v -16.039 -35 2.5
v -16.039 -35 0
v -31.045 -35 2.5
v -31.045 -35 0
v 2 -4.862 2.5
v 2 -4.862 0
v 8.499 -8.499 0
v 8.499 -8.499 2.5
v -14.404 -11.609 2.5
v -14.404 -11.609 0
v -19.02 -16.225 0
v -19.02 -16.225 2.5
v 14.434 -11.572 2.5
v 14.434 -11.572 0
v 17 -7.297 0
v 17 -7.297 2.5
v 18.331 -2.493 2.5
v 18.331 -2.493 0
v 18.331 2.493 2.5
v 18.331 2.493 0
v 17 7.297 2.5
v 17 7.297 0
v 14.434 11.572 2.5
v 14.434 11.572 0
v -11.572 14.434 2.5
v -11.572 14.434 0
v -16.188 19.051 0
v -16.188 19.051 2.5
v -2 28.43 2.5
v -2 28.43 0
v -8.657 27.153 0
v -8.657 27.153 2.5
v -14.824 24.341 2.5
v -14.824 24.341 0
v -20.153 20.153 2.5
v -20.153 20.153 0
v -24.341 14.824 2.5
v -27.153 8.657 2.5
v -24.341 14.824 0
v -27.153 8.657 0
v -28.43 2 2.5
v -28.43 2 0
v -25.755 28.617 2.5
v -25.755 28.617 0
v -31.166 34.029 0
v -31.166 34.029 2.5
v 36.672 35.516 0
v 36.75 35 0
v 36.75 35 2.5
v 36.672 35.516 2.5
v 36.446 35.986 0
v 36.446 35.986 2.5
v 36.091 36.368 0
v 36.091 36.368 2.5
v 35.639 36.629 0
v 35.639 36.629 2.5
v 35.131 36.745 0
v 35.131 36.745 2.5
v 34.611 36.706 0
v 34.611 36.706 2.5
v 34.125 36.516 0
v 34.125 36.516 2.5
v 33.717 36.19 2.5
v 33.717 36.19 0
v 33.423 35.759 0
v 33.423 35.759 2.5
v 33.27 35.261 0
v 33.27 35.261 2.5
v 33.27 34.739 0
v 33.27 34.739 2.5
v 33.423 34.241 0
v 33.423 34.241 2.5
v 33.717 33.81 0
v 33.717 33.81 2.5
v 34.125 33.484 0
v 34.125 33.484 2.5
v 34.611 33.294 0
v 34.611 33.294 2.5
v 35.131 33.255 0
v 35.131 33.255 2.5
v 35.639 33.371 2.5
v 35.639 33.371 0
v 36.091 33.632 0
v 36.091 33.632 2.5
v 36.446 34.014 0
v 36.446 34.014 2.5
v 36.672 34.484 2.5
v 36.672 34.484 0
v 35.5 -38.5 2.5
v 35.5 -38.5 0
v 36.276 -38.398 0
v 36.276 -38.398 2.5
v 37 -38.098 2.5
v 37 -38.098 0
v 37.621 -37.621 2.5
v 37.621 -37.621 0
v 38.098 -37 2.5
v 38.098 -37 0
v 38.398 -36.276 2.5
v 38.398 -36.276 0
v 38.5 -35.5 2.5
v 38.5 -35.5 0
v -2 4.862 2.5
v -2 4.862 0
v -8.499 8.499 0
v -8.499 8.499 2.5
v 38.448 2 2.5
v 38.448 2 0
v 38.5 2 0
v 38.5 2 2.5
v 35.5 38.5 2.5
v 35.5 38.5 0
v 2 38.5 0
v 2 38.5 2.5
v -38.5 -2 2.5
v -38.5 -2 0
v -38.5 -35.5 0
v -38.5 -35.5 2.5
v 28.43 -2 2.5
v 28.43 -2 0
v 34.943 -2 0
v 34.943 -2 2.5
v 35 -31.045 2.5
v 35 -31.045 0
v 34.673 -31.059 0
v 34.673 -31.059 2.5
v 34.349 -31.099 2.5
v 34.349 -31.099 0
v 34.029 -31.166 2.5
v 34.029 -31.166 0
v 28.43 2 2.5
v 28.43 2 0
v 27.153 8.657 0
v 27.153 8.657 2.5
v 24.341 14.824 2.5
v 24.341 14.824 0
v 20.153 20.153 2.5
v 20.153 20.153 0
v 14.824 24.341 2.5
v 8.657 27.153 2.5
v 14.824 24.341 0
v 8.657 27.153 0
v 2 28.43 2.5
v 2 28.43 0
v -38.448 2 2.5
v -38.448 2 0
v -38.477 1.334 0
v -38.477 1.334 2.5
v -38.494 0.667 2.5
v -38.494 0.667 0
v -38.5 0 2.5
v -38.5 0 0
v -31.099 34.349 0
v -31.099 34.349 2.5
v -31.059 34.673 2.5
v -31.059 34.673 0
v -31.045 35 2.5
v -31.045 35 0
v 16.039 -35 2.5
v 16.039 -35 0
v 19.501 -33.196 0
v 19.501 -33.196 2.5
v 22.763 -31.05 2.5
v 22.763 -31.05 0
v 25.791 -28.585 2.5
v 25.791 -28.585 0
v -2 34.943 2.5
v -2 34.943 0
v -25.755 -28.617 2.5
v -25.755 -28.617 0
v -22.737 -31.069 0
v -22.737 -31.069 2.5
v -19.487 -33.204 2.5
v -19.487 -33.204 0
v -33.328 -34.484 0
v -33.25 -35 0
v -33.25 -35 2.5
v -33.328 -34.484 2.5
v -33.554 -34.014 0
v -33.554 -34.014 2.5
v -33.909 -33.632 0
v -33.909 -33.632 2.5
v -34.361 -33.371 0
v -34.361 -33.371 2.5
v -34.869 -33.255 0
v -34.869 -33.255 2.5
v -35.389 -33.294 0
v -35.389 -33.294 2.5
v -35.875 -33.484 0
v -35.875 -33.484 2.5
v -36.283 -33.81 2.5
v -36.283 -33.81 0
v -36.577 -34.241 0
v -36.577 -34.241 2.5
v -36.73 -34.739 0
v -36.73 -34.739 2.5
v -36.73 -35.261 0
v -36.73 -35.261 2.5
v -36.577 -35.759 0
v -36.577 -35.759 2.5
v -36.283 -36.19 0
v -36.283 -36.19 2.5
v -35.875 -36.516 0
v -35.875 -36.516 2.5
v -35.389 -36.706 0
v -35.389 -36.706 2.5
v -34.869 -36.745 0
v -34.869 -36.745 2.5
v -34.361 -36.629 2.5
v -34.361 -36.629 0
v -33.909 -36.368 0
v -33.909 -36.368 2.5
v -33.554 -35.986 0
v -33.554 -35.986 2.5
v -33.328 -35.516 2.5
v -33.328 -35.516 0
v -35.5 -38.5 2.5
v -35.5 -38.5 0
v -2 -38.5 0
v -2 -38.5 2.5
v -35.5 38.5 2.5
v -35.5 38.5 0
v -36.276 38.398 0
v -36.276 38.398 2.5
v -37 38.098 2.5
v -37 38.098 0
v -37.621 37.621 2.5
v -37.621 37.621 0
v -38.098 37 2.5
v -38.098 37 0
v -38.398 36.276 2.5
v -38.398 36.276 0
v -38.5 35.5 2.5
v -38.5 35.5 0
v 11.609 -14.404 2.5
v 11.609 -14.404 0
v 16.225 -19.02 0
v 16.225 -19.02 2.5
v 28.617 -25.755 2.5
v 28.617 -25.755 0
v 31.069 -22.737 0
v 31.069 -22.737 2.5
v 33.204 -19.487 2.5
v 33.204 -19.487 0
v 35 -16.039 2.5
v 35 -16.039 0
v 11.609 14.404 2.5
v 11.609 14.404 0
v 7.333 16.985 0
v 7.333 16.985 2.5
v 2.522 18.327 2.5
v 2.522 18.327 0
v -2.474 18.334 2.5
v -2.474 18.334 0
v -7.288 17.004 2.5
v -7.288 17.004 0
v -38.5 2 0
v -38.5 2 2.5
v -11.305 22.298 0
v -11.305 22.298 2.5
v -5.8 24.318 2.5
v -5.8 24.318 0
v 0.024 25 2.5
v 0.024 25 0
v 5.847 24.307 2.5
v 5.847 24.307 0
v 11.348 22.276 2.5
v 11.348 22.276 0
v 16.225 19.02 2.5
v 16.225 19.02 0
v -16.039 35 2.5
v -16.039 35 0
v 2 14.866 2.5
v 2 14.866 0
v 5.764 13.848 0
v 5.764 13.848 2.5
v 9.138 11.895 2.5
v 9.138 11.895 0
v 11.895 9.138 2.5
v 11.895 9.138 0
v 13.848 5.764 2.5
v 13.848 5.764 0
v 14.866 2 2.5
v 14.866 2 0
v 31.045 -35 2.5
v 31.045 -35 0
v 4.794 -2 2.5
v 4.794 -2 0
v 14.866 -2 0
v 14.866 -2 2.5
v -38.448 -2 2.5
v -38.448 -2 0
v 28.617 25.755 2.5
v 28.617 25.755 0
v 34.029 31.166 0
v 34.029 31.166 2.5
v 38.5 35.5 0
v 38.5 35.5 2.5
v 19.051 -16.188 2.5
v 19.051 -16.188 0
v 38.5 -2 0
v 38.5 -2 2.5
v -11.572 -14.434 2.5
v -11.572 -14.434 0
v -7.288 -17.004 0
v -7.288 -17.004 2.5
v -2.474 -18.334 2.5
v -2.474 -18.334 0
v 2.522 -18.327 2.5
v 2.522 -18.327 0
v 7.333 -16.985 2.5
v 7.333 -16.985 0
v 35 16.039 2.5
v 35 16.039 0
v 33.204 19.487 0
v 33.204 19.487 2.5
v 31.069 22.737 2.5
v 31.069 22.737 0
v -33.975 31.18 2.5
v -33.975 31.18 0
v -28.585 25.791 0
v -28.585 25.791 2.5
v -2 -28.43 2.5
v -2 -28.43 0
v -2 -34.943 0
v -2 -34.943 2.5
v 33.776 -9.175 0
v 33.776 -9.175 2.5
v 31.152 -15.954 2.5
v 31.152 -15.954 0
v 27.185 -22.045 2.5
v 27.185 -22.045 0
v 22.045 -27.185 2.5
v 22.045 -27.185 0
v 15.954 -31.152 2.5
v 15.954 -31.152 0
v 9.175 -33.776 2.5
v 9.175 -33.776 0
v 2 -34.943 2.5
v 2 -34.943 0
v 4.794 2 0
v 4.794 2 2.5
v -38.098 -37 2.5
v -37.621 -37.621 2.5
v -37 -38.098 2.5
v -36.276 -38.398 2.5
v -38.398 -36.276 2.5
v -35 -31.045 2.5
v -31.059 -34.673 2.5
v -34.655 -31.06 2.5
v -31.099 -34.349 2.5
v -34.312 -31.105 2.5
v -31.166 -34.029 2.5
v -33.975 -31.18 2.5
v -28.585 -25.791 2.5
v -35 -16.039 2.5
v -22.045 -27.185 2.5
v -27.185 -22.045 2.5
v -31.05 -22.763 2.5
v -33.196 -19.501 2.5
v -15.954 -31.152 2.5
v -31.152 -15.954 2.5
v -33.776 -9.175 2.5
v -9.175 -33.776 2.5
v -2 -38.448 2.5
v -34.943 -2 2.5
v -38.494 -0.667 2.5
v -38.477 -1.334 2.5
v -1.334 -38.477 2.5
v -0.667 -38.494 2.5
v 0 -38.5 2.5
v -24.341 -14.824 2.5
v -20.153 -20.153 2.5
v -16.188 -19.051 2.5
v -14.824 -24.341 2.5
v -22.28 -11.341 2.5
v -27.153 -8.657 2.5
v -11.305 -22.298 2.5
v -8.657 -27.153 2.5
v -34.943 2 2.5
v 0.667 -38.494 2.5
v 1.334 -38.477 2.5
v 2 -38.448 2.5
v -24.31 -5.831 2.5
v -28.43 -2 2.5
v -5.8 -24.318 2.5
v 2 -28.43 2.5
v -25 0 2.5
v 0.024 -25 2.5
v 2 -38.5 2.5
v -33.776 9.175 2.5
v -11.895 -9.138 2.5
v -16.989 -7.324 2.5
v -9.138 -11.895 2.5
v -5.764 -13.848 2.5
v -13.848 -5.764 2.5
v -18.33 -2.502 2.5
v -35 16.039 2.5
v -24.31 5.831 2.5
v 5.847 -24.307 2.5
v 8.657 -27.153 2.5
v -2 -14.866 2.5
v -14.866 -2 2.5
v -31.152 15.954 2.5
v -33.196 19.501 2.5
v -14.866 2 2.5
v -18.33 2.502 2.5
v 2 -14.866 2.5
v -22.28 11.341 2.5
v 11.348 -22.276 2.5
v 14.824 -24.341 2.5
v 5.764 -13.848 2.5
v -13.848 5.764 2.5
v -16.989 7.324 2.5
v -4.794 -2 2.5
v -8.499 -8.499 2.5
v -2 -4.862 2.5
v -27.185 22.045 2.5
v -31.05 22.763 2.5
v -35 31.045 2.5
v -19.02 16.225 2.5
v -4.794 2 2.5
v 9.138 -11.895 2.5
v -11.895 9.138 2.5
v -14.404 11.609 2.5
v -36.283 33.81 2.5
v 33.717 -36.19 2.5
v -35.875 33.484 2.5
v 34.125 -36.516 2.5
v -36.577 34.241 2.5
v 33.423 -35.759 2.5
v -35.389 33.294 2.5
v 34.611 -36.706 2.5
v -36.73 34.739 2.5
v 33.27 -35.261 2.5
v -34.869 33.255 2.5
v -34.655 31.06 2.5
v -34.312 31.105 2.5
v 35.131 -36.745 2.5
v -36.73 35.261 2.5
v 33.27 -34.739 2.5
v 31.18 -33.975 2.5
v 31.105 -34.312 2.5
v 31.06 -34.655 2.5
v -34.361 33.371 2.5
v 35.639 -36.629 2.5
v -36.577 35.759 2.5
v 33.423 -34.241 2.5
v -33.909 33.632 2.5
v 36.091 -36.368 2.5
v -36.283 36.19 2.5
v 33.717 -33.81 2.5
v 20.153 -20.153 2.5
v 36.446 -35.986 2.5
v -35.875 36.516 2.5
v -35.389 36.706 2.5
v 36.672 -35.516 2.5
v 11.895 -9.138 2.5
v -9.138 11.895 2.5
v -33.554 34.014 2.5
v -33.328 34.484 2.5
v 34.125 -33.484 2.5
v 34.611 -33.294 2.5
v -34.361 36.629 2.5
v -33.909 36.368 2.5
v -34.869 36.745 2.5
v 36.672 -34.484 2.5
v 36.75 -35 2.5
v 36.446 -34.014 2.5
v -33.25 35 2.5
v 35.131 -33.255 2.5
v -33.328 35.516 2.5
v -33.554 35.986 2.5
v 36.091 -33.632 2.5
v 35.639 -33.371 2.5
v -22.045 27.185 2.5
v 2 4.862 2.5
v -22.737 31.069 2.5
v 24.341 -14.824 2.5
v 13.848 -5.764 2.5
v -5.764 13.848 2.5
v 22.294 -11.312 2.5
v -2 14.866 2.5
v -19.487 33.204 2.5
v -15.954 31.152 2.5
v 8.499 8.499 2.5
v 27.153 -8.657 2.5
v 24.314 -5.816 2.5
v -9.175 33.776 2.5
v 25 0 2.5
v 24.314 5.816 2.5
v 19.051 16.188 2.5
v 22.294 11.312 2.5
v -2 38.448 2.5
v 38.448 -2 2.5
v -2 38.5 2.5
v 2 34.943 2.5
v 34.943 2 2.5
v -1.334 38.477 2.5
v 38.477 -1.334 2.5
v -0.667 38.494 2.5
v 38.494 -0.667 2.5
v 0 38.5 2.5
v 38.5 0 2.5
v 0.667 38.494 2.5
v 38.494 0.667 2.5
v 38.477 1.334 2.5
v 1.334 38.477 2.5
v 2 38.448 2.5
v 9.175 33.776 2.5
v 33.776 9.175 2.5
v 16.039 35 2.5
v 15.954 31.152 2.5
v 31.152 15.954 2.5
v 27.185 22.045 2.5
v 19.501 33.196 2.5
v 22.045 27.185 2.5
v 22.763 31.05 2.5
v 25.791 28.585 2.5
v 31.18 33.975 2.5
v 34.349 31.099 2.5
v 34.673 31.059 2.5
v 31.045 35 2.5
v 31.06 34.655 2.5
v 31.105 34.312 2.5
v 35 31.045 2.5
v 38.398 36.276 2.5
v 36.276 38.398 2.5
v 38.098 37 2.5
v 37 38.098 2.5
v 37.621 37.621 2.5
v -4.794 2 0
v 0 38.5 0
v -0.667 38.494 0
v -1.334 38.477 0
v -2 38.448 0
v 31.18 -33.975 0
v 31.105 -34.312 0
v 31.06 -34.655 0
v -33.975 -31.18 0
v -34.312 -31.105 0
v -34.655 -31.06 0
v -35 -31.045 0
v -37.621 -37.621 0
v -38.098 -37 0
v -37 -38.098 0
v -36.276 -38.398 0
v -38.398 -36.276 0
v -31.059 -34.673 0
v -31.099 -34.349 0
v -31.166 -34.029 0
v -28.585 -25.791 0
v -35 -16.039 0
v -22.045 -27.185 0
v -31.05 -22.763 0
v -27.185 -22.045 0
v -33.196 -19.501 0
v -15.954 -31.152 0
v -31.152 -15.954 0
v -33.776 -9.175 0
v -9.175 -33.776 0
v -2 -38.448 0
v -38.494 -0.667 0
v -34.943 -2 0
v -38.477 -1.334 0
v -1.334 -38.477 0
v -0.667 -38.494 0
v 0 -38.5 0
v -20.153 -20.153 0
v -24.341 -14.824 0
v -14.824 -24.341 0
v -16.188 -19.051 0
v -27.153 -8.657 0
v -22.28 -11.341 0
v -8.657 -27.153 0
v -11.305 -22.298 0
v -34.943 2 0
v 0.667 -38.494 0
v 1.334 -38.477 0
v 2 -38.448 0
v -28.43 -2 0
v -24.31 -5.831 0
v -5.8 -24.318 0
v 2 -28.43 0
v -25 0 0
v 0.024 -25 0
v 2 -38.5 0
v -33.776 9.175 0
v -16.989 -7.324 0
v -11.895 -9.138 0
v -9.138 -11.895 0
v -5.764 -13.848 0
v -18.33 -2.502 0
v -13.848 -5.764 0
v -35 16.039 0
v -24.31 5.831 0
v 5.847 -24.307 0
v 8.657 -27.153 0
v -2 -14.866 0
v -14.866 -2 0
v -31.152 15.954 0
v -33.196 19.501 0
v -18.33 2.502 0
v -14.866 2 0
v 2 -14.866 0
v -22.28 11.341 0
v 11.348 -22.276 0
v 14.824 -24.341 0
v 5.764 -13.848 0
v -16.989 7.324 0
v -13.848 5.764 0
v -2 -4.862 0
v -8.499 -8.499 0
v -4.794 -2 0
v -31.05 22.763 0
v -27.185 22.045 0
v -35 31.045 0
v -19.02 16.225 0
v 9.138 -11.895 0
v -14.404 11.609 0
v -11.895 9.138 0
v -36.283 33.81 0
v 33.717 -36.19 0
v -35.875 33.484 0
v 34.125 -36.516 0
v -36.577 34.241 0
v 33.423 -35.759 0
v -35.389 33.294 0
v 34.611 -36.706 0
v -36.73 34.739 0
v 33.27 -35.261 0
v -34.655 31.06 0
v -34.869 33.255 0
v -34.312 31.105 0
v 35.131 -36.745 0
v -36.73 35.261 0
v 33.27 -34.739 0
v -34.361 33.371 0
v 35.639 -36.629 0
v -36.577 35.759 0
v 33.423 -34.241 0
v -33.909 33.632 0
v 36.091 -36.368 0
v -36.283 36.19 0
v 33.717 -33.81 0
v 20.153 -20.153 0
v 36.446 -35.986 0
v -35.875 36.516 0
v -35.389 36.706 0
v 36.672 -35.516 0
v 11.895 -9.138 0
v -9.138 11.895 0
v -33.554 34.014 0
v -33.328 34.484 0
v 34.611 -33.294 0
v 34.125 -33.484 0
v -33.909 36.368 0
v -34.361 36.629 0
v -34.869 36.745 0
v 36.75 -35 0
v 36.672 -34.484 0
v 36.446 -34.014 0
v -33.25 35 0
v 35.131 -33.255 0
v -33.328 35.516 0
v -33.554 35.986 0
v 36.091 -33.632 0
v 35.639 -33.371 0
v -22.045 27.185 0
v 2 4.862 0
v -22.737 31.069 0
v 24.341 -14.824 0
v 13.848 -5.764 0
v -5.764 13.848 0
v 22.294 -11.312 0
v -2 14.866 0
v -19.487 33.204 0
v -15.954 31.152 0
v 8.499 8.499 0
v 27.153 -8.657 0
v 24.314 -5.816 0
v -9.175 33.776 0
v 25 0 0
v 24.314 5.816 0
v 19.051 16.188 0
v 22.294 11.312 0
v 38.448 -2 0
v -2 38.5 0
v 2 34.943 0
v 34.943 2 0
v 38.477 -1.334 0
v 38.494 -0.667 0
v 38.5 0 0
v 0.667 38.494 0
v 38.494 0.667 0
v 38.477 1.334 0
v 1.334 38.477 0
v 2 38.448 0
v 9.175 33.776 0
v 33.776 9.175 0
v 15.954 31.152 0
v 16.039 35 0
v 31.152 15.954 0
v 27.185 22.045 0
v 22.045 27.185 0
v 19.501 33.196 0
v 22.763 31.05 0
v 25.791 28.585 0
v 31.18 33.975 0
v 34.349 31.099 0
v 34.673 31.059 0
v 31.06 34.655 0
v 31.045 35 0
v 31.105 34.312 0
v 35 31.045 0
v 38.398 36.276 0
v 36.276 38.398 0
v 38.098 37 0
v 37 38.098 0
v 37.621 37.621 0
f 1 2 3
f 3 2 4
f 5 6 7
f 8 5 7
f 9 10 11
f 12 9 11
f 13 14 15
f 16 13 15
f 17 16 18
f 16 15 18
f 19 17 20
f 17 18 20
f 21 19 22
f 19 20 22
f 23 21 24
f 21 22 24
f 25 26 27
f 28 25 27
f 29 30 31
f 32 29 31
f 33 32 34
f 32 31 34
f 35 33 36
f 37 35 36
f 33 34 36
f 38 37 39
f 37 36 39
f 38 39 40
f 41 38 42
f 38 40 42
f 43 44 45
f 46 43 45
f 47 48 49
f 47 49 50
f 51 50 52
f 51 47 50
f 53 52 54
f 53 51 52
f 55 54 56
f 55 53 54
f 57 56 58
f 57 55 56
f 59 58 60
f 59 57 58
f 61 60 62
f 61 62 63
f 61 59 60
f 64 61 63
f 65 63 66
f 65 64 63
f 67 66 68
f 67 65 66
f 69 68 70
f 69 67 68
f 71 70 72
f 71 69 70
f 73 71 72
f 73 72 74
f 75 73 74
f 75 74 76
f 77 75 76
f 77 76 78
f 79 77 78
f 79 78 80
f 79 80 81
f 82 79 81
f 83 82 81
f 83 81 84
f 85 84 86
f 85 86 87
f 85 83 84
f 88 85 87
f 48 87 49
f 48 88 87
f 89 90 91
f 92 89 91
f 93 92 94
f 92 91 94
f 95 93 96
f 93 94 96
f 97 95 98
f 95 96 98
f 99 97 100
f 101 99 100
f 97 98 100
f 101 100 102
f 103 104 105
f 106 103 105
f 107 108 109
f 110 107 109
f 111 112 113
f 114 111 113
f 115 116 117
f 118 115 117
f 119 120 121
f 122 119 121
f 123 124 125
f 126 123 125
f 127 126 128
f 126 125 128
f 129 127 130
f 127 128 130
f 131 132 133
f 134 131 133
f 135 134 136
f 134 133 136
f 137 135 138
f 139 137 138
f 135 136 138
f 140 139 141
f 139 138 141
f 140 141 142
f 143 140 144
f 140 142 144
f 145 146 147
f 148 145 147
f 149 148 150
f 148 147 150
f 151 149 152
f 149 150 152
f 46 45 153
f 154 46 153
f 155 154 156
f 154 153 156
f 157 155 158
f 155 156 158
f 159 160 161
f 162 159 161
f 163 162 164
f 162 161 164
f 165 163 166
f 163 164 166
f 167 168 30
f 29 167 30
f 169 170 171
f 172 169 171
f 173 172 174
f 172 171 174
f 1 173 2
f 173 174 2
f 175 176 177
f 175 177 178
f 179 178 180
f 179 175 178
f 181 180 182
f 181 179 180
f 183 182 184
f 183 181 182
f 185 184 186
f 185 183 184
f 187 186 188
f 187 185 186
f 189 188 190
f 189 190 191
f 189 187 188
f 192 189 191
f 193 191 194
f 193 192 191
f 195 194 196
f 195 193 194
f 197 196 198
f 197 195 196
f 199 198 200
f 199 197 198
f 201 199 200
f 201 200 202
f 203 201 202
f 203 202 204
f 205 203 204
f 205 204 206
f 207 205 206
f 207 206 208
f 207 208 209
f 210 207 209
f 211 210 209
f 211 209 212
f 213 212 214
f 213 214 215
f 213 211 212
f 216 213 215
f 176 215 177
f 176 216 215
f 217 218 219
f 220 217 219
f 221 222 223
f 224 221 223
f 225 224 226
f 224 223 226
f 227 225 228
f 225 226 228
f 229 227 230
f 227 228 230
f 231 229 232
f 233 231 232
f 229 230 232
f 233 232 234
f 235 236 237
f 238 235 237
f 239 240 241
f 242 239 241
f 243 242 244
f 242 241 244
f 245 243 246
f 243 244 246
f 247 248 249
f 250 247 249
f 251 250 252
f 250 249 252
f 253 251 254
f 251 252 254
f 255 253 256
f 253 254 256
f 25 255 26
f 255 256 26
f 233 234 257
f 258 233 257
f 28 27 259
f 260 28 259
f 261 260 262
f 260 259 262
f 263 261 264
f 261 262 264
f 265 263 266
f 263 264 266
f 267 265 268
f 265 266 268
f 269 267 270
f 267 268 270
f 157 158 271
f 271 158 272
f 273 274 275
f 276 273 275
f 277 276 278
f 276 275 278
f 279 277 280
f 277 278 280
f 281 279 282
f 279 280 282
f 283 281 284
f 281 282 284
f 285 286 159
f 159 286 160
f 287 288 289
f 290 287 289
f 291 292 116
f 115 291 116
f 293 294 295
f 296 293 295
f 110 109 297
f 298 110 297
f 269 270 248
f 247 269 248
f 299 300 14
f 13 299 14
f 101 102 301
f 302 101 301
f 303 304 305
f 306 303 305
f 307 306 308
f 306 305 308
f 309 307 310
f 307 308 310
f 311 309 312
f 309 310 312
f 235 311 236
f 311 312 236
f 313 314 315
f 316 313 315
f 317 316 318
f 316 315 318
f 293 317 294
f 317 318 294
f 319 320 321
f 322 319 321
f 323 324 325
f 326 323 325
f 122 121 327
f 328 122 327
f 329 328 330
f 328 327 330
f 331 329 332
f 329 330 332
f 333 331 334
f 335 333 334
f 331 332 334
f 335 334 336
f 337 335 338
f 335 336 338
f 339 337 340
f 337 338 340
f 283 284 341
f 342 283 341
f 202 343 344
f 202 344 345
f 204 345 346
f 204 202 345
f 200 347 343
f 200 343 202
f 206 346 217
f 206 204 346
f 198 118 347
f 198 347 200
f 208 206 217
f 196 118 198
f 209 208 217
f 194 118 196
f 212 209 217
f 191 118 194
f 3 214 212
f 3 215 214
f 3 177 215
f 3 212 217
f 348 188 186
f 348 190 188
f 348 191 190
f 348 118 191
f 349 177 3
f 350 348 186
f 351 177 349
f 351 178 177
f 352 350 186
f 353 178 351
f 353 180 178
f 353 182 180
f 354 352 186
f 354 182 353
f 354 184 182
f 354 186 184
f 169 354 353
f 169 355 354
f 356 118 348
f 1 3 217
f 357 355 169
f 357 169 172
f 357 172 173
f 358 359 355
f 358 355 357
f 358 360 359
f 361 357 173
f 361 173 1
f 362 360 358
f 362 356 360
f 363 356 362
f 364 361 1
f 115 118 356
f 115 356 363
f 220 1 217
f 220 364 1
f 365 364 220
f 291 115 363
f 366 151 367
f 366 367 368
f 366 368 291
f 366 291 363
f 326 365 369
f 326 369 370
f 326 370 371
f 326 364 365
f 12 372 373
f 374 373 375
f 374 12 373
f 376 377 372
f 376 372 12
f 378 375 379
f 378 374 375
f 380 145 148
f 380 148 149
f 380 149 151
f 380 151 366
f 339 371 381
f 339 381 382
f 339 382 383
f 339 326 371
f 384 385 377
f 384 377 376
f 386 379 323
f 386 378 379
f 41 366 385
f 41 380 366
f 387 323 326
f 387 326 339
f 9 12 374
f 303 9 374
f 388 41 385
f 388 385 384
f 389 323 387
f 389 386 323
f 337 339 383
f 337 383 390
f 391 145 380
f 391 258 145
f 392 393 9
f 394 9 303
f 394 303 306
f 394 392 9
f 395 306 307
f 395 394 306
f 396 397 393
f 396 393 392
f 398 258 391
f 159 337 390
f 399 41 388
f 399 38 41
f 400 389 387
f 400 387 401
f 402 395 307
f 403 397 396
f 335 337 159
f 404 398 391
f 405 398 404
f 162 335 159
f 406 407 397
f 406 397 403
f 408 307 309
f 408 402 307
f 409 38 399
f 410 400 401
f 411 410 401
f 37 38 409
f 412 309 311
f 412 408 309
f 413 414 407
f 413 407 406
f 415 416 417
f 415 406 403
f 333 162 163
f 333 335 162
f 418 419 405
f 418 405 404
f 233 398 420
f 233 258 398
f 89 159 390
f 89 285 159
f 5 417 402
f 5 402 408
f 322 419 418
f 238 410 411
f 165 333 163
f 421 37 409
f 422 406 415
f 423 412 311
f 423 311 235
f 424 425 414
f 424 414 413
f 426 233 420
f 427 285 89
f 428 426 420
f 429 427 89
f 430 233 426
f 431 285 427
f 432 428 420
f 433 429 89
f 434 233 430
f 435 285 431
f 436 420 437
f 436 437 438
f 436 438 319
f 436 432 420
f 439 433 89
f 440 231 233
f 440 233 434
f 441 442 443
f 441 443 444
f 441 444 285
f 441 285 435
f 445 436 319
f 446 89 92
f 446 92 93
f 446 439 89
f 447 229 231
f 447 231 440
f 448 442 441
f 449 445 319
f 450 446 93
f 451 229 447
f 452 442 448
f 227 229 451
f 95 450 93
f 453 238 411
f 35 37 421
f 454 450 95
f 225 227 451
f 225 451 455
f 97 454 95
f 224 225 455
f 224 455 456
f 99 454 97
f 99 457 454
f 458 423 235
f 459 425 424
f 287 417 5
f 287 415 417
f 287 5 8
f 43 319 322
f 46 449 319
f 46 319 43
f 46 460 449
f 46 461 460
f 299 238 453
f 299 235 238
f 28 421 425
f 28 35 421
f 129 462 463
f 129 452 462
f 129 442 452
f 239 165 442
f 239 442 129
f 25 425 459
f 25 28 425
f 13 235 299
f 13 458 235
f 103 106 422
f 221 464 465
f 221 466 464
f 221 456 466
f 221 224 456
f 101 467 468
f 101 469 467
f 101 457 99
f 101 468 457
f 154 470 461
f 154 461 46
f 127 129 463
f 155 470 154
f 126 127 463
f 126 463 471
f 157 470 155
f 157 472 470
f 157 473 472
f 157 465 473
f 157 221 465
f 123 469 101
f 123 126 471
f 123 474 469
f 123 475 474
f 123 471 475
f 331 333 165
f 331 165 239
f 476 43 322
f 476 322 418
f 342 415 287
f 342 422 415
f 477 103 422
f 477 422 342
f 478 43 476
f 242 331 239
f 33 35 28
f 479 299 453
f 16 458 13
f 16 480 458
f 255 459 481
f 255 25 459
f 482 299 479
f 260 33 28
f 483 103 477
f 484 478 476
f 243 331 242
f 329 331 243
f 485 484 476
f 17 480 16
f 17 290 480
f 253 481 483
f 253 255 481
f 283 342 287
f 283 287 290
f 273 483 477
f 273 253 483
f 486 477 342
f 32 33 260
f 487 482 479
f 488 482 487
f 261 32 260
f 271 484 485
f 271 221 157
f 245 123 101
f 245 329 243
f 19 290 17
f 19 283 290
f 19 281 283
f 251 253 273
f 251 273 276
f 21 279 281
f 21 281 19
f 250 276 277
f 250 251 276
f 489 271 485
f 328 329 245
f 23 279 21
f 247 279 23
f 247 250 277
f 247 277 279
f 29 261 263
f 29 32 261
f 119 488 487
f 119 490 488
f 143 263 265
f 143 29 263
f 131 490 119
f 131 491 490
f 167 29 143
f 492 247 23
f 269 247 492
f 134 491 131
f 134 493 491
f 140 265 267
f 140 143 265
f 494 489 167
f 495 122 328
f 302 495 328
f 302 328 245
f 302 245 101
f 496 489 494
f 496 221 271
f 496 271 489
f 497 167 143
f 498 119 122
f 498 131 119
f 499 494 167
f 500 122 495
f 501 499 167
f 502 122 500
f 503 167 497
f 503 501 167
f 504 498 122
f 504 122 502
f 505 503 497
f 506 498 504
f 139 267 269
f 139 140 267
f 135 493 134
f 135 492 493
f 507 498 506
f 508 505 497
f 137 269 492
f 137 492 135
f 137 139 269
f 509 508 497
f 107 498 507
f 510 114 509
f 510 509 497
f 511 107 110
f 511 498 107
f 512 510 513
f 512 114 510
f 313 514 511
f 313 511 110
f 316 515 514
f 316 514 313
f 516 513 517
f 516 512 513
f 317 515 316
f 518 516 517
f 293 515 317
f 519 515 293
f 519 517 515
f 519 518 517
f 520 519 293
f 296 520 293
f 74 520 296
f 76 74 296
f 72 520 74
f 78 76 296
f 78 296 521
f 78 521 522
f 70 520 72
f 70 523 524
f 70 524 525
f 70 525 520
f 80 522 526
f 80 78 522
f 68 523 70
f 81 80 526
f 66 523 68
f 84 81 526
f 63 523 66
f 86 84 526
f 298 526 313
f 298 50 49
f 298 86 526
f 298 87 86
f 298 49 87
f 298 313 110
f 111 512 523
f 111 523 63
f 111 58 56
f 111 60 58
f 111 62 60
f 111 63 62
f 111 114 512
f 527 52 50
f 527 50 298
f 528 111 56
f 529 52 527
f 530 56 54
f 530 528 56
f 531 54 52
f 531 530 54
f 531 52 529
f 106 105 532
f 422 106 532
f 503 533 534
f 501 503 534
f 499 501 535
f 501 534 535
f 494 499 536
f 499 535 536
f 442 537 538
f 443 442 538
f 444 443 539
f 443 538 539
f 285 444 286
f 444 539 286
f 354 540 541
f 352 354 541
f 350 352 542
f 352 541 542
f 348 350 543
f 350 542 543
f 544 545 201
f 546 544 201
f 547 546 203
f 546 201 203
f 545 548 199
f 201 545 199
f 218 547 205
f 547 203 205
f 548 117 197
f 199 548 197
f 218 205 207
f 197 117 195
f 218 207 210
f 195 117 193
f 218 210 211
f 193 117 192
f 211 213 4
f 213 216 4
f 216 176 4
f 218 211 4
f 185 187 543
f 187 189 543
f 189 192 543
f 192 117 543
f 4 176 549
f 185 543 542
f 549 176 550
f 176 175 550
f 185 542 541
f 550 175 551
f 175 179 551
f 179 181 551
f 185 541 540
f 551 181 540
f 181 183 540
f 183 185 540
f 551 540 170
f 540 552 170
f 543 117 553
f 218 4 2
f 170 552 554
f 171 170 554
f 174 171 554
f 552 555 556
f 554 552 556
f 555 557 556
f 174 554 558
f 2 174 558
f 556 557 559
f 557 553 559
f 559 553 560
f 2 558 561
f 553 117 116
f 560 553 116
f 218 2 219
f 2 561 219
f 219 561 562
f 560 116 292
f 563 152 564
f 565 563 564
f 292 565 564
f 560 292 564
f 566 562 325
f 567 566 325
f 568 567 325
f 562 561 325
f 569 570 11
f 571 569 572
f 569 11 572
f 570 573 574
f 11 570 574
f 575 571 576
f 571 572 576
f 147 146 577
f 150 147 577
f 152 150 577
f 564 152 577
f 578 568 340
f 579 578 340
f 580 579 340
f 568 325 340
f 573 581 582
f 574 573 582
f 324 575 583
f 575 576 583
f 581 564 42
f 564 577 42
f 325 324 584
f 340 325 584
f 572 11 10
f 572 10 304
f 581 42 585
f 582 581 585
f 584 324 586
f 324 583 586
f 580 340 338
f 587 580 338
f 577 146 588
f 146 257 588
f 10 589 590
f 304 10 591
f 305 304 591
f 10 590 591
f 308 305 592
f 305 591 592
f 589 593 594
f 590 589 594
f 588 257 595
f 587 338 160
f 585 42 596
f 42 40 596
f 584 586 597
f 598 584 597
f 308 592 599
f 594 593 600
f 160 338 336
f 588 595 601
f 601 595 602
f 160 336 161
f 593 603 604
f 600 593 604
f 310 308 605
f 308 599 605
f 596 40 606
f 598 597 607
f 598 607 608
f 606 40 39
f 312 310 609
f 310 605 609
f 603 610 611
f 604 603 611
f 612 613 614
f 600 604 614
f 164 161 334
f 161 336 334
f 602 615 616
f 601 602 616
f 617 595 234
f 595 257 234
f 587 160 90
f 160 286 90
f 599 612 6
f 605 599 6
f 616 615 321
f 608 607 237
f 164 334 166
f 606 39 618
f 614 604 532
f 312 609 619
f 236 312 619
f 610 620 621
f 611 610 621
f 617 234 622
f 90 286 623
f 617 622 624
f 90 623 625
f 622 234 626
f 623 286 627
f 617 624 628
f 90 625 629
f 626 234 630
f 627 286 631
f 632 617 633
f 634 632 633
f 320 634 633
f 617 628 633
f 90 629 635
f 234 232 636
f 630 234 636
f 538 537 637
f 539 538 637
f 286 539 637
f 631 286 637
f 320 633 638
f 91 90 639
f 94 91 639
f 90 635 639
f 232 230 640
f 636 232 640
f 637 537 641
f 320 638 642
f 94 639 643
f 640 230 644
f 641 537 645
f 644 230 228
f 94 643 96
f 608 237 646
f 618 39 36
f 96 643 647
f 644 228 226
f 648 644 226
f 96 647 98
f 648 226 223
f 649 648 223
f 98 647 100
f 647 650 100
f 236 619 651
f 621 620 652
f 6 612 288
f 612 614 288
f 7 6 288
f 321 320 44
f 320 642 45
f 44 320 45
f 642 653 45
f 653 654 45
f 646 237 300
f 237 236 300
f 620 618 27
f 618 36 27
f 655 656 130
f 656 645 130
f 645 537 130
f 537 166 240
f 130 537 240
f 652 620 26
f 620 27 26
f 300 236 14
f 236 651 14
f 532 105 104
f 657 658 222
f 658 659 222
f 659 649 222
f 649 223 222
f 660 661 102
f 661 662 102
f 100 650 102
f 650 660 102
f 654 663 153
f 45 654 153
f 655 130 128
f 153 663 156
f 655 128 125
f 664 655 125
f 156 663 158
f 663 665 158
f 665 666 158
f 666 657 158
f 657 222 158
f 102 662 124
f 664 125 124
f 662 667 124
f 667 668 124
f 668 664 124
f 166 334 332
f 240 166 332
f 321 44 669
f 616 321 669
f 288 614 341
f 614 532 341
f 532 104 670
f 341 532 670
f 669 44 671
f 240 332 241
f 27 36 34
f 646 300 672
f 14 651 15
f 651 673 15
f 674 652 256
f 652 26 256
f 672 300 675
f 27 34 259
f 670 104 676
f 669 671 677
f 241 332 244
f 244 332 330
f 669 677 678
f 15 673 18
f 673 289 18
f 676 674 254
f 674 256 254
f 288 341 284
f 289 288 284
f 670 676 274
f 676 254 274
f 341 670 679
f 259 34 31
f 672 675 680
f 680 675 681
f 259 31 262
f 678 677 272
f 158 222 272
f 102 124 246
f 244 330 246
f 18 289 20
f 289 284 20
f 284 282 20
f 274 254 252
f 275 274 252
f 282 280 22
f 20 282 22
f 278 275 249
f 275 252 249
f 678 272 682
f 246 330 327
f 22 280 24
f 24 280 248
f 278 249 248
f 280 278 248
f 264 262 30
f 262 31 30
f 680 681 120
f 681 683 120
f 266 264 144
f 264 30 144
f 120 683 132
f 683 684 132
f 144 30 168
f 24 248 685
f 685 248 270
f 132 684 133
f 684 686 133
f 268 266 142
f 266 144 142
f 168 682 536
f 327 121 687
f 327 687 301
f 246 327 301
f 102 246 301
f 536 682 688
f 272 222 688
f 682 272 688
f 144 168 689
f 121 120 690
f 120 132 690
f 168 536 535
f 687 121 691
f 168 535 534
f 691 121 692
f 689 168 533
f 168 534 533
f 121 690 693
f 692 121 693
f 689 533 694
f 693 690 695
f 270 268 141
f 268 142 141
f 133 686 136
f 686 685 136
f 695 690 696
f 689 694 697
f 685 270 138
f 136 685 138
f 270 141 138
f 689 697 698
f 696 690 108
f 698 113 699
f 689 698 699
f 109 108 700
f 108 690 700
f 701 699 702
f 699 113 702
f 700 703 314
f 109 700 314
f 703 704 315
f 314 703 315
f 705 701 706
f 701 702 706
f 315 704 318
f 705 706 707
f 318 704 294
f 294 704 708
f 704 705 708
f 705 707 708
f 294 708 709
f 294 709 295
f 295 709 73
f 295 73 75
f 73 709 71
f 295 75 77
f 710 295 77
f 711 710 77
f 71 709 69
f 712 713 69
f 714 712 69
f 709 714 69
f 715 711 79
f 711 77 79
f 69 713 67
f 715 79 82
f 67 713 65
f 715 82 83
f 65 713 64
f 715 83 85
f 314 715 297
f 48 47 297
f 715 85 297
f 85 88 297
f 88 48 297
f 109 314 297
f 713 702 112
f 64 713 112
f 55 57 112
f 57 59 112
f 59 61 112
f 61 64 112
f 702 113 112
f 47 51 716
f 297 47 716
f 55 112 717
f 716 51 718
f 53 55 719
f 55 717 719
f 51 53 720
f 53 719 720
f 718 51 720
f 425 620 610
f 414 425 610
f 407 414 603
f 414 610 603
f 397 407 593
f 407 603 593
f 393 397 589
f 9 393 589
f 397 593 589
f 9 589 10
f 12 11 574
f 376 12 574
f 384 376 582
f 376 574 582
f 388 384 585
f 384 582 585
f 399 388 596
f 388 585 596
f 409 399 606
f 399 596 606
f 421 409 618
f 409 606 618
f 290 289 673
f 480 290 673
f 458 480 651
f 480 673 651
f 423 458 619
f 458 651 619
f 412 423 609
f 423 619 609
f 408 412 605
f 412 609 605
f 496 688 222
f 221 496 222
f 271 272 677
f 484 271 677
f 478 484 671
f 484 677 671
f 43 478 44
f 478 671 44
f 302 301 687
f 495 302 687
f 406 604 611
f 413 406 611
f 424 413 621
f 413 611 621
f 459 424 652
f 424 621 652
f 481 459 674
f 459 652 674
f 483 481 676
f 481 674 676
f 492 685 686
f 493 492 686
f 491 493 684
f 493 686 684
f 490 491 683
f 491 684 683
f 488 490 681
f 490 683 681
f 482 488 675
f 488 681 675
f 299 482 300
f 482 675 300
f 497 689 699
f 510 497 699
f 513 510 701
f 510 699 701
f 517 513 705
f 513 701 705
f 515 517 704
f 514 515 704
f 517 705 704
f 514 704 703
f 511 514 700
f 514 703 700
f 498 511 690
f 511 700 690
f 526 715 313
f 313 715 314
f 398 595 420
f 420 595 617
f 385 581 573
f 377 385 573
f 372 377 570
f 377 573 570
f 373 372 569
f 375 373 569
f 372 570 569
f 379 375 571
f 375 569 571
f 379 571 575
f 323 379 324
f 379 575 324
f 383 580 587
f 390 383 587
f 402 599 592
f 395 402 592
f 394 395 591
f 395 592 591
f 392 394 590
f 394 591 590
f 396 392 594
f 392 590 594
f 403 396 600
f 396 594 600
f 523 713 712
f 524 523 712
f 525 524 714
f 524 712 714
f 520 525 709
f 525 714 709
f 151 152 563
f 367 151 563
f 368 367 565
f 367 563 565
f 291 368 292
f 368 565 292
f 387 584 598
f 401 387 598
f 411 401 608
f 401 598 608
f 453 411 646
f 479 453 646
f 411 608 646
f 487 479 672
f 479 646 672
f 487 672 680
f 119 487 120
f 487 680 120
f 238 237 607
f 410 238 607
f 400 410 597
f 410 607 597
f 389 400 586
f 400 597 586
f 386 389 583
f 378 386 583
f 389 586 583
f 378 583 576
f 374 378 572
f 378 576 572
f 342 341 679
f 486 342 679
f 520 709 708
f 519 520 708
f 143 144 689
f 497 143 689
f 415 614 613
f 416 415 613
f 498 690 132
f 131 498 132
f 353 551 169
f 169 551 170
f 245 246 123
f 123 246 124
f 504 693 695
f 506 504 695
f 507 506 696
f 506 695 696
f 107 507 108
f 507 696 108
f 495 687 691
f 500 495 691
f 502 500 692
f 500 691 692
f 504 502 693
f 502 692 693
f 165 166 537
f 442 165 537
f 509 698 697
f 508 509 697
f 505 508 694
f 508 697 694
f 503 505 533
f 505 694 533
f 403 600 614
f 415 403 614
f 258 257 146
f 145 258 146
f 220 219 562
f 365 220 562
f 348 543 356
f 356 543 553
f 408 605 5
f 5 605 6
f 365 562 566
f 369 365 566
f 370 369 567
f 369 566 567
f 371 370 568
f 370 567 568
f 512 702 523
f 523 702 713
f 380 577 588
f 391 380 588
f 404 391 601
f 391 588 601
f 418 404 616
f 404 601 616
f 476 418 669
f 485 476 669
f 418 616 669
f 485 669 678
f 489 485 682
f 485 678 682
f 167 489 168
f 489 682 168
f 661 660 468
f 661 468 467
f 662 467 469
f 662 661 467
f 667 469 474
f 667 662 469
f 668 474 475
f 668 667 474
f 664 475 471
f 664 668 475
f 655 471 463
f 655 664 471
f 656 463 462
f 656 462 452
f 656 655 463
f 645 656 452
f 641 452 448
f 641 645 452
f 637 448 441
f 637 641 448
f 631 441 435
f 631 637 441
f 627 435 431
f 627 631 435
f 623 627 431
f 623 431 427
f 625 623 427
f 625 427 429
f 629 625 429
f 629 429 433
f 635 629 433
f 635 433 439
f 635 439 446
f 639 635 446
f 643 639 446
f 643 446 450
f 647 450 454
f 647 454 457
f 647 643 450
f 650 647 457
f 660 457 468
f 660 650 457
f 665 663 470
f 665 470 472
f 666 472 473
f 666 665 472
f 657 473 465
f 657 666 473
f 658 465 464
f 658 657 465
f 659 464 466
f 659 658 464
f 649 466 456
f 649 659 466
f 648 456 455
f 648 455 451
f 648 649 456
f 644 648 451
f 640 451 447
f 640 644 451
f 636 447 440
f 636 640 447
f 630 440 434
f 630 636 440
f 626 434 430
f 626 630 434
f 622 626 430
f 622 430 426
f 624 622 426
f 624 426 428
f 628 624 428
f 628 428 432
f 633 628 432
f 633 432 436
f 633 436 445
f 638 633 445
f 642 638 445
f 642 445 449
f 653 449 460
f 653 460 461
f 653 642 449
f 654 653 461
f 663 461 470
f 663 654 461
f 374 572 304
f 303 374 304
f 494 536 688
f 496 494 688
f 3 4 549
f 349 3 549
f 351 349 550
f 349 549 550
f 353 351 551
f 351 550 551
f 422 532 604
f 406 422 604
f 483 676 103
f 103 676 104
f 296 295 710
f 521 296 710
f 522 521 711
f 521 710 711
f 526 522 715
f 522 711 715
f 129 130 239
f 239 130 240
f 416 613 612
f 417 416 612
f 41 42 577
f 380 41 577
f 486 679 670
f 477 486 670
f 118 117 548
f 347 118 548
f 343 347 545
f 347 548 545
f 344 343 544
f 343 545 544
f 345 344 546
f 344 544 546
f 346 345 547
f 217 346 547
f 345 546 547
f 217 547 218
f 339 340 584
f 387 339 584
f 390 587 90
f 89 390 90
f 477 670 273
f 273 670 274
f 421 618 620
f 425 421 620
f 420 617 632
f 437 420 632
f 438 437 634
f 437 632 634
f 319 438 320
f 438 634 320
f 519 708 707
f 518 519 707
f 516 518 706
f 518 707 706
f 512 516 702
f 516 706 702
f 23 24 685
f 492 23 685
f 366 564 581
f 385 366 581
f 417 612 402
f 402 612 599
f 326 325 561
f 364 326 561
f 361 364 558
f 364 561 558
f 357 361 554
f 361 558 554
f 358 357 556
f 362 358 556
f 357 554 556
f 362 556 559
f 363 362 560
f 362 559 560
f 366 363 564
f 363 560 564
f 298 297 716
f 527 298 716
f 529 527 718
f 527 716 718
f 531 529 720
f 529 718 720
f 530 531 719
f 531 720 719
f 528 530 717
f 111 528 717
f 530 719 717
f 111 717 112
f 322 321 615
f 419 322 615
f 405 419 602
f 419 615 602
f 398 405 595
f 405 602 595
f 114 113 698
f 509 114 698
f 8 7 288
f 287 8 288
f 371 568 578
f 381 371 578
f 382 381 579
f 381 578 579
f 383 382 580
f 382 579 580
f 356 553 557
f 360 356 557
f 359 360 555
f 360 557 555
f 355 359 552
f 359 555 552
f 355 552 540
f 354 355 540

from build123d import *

# Parameters (mm, degrees)
F0_R     = 1.75
F1_DEPTH = 2.5


with BuildPart() as f1:
    # F0 (on Top) → F1 (new body)
    with BuildSketch(Plane.XY):
        with BuildLine():
            ThreePointArc((-38.5, -35.5), (-37.62132, -37.62132), (-35.5, -38.5))
            Line((-35.5, -38.5), (-2, -38.5))
            Line((-2, -38.5), (-2, -38.448017))
            ThreePointArc((-2, -38.448017), (-1.000338, -38.487002), (0, -38.5))
            ThreePointArc((0, -38.5), (1.000338, -38.487002), (2, -38.448017))
            Line((2, -38.448017), (2, -38.5))
            Line((2, -38.5), (35.5, -38.5))
            ThreePointArc((35.5, -38.5), (37.62132, -37.62132), (38.5, -35.5))
            Line((38.5, -35.5), (38.5, -2))
            Line((38.5, -2), (38.448017, -2))
            ThreePointArc((38.448017, -2), (38.487002, -1.000338), (38.5, 0))
            ThreePointArc((38.5, 0), (38.487002, 1.000338), (38.448017, 2))
            Line((38.448017, 2), (38.5, 2))
            Line((38.5, 2), (38.5, 35.5))
            ThreePointArc((38.5, 35.5), (37.62132, 37.62132), (35.5, 38.5))
            Line((35.5, 38.5), (2, 38.5))
            Line((2, 38.5), (2, 38.448017))
            ThreePointArc((2, 38.448017), (1.000338, 38.487002), (0, 38.5))
            ThreePointArc((0, 38.5), (-1.000338, 38.487002), (-2, 38.448017))
            Line((-2, 38.448017), (-2, 38.5))
            Line((-2, 38.5), (-35.5, 38.5))
            ThreePointArc((-35.5, 38.5), (-37.62132, 37.62132), (-38.5, 35.5))
            Line((-38.5, 35.5), (-38.5, 2))
            Line((-38.5, 2), (-38.448017, 2))
            ThreePointArc((-38.448017, 2), (-38.487002, 1.000338), (-38.5, 0))
            ThreePointArc((-38.5, 0), (-38.487002, -1.000338), (-38.448017, -2))
            Line((-38.448017, -2), (-38.5, -2))
            Line((-38.5, -2), (-38.5, -35.5))
        make_face()
        with Locations((-35, -35)):
            Circle(F0_R, mode=Mode.SUBTRACT)
        with BuildLine():
            Line((-16.039015, -35), (-31.045212, -35))
            ThreePointArc((-31.045212, -35), (-31.075605, -34.510637), (-31.166319, -34.028796))
            Line((-31.166319, -34.028796), (-25.754724, -28.617201))
            ThreePointArc((-25.754724, -28.617201), (-21.139162, -32.177412), (-16.039015, -35))
        make_face(mode=Mode.SUBTRACT)
        with BuildLine():
            ThreePointArc((-33.974785, -31.180408), (-34.482954, -31.079157), (-35, -31.045212))
            Line((-35, -31.045212), (-35, -16.039015))
            ThreePointArc((-35, -16.039015), (-32.164167, -21.159309), (-28.584922, -25.790545))
            Line((-28.584922, -25.790545), (-33.974785, -31.180408))
        make_face(mode=Mode.SUBTRACT)
        with BuildLine():
            Line((-2, -28.429738), (-2, -34.94281))
            ThreePointArc((-2, -34.94281), (-24.748737, -24.748737), (-34.94281, -2))
            Line((-34.94281, -2), (-28.429738, -2))
            ThreePointArc((-28.429738, -2), (-20.152543, -20.152543), (-2, -28.429738))
        make_face(mode=Mode.SUBTRACT)
        with BuildLine():
            Line((-2, -4.862478), (-2, -14.866069))
            ThreePointArc((-2, -14.866069), (-10.606602, -10.606602), (-14.866069, -2))
            Line((-14.866069, -2), (-4.794377, -2))
            Line((-4.794377, -2), (-8.49896, -8.49896))
            Line((-8.49896, -8.49896), (-2, -4.862478))
        make_face(mode=Mode.SUBTRACT)
        with BuildLine():
            ThreePointArc((-11.571705, -14.434183), (0.024219, -18.499984), (11.609459, -14.403835))
            Line((11.609459, -14.403835), (16.22518, -19.019557))
            ThreePointArc((16.22518, -19.019557), (0.024155, -24.999988), (-16.188397, -19.050874))
            Line((-16.188397, -19.050874), (-11.571705, -14.434183))
        make_face(mode=Mode.SUBTRACT)
        with BuildLine():
            Line((25.790545, -28.584922), (31.180408, -33.974785))
            ThreePointArc((31.180408, -33.974785), (31.079157, -34.482954), (31.045212, -35))
            Line((31.045212, -35), (16.039015, -35))
            ThreePointArc((16.039015, -35), (21.159309, -32.164167), (25.790545, -28.584922))
        make_face(mode=Mode.SUBTRACT)
        with Locations((35, -35)):
            Circle(F0_R, mode=Mode.SUBTRACT)
        with BuildLine():
            Line((35, -16.039015), (35, -31.045212))
            ThreePointArc((35, -31.045212), (34.510637, -31.075605), (34.028796, -31.166319))
            Line((34.028796, -31.166319), (28.617201, -25.754724))
            ThreePointArc((28.617201, -25.754724), (32.177412, -21.139162), (35, -16.039015))
        make_face(mode=Mode.SUBTRACT)
        with BuildLine():
            ThreePointArc((2, -28.429738), (20.152543, -20.152543), (28.429738, -2))
            Line((28.429738, -2), (34.94281, -2))
            ThreePointArc((34.94281, -2), (24.748737, -24.748737), (2, -34.94281))
            Line((2, -34.94281), (2, -28.429738))
        make_face(mode=Mode.SUBTRACT)
        with BuildLine():
            ThreePointArc((14.866069, -2), (10.606602, -10.606602), (2, -14.866069))
            Line((2, -14.866069), (2, -4.862478))
            Line((2, -4.862478), (8.49896, -8.49896))
            Line((8.49896, -8.49896), (4.794377, -2))
            Line((4.794377, -2), (14.866069, -2))
        make_face(mode=Mode.SUBTRACT)
        with BuildLine():
            ThreePointArc((-19.019557, -16.22518), (-25, 0), (-19.019557, 16.22518))
            Line((-19.019557, 16.22518), (-14.403835, 11.609459))
            ThreePointArc((-14.403835, 11.609459), (-18.5, 0), (-14.403835, -11.609459))
            Line((-14.403835, -11.609459), (-19.019557, -16.22518))
        make_face(mode=Mode.SUBTRACT)
        with BuildLine():
            ThreePointArc((-14.866069, 2), (-10.606602, 10.606602), (-2, 14.866069))
            Line((-2, 14.866069), (-2, 4.862478))
            Line((-2, 4.862478), (-8.49896, 8.49896))
            Line((-8.49896, 8.49896), (-4.794377, 2))
            Line((-4.794377, 2), (-14.866069, 2))
        make_face(mode=Mode.SUBTRACT)
        with BuildLine():
            ThreePointArc((-34.94281, 2), (-24.748737, 24.748737), (-2, 34.94281))
            Line((-2, 34.94281), (-2, 28.429738))
            ThreePointArc((-2, 28.429738), (-20.152543, 20.152543), (-28.429738, 2))
            Line((-28.429738, 2), (-34.94281, 2))
        make_face(mode=Mode.SUBTRACT)
        with BuildLine():
            Line((-33.974785, 31.180408), (-28.584922, 25.790545))
            ThreePointArc((-28.584922, 25.790545), (-32.164167, 21.159309), (-35, 16.039015))
            Line((-35, 16.039015), (-35, 31.045212))
            ThreePointArc((-35, 31.045212), (-34.482954, 31.079157), (-33.974785, 31.180408))
        make_face(mode=Mode.SUBTRACT)
        with Locations((-35, 35)):
            Circle(F0_R, mode=Mode.SUBTRACT)
        with BuildLine():
            ThreePointArc((-31.166319, 34.028796), (-31.075605, 34.510637), (-31.045212, 35))
            Line((-31.045212, 35), (-16.039015, 35))
            ThreePointArc((-16.039015, 35), (-21.139162, 32.177412), (-25.754724, 28.617201))
            Line((-25.754724, 28.617201), (-31.166319, 34.028796))
        make_face(mode=Mode.SUBTRACT)
        with BuildLine():
            ThreePointArc((2, 14.866069), (10.606602, 10.606602), (14.866069, 2))
            Line((14.866069, 2), (4.794377, 2))
            Line((4.794377, 2), (8.49896, 8.49896))
            Line((8.49896, 8.49896), (2, 4.862478))
            Line((2, 4.862478), (2, 14.866069))
        make_face(mode=Mode.SUBTRACT)
        with BuildLine():
            ThreePointArc((28.429738, 2), (20.152543, 20.152543), (2, 28.429738))
            Line((2, 28.429738), (2, 34.94281))
            ThreePointArc((2, 34.94281), (24.748737, 24.748737), (34.94281, 2))
            Line((34.94281, 2), (28.429738, 2))
        make_face(mode=Mode.SUBTRACT)
        with BuildLine():
            ThreePointArc((14.434183, -11.571705), (18.5, 0), (14.434183, 11.571705))
            Line((14.434183, 11.571705), (19.050874, 16.188397))
            ThreePointArc((19.050874, 16.188397), (25, 0), (19.050874, -16.188397))
            Line((19.050874, -16.188397), (14.434183, -11.571705))
        make_face(mode=Mode.SUBTRACT)
        with BuildLine():
            ThreePointArc((11.609459, 14.403835), (0.024219, 18.499984), (-11.571705, 14.434183))
            Line((-11.571705, 14.434183), (-16.188397, 19.050874))
            ThreePointArc((-16.188397, 19.050874), (0.024155, 24.999988), (16.22518, 19.019557))
            Line((16.22518, 19.019557), (11.609459, 14.403835))
        make_face(mode=Mode.SUBTRACT)
        with BuildLine():
            ThreePointArc((34.028796, 31.166319), (34.510637, 31.075605), (35, 31.045212))
            Line((35, 31.045212), (35, 16.039015))
            ThreePointArc((35, 16.039015), (32.177412, 21.139162), (28.617201, 25.754724))
            Line((28.617201, 25.754724), (34.028796, 31.166319))
        make_face(mode=Mode.SUBTRACT)
        with BuildLine():
            ThreePointArc((25.790545, 28.584922), (21.159309, 32.164167), (16.039015, 35))
            Line((16.039015, 35), (31.045212, 35))
            ThreePointArc((31.045212, 35), (31.079157, 34.482954), (31.180408, 33.974785))
            Line((31.180408, 33.974785), (25.790545, 28.584922))
        make_face(mode=Mode.SUBTRACT)
        with Locations((35, 35)):
            Circle(F0_R, mode=Mode.SUBTRACT)
    extrude(amount=F1_DEPTH)


solid = f1.part
